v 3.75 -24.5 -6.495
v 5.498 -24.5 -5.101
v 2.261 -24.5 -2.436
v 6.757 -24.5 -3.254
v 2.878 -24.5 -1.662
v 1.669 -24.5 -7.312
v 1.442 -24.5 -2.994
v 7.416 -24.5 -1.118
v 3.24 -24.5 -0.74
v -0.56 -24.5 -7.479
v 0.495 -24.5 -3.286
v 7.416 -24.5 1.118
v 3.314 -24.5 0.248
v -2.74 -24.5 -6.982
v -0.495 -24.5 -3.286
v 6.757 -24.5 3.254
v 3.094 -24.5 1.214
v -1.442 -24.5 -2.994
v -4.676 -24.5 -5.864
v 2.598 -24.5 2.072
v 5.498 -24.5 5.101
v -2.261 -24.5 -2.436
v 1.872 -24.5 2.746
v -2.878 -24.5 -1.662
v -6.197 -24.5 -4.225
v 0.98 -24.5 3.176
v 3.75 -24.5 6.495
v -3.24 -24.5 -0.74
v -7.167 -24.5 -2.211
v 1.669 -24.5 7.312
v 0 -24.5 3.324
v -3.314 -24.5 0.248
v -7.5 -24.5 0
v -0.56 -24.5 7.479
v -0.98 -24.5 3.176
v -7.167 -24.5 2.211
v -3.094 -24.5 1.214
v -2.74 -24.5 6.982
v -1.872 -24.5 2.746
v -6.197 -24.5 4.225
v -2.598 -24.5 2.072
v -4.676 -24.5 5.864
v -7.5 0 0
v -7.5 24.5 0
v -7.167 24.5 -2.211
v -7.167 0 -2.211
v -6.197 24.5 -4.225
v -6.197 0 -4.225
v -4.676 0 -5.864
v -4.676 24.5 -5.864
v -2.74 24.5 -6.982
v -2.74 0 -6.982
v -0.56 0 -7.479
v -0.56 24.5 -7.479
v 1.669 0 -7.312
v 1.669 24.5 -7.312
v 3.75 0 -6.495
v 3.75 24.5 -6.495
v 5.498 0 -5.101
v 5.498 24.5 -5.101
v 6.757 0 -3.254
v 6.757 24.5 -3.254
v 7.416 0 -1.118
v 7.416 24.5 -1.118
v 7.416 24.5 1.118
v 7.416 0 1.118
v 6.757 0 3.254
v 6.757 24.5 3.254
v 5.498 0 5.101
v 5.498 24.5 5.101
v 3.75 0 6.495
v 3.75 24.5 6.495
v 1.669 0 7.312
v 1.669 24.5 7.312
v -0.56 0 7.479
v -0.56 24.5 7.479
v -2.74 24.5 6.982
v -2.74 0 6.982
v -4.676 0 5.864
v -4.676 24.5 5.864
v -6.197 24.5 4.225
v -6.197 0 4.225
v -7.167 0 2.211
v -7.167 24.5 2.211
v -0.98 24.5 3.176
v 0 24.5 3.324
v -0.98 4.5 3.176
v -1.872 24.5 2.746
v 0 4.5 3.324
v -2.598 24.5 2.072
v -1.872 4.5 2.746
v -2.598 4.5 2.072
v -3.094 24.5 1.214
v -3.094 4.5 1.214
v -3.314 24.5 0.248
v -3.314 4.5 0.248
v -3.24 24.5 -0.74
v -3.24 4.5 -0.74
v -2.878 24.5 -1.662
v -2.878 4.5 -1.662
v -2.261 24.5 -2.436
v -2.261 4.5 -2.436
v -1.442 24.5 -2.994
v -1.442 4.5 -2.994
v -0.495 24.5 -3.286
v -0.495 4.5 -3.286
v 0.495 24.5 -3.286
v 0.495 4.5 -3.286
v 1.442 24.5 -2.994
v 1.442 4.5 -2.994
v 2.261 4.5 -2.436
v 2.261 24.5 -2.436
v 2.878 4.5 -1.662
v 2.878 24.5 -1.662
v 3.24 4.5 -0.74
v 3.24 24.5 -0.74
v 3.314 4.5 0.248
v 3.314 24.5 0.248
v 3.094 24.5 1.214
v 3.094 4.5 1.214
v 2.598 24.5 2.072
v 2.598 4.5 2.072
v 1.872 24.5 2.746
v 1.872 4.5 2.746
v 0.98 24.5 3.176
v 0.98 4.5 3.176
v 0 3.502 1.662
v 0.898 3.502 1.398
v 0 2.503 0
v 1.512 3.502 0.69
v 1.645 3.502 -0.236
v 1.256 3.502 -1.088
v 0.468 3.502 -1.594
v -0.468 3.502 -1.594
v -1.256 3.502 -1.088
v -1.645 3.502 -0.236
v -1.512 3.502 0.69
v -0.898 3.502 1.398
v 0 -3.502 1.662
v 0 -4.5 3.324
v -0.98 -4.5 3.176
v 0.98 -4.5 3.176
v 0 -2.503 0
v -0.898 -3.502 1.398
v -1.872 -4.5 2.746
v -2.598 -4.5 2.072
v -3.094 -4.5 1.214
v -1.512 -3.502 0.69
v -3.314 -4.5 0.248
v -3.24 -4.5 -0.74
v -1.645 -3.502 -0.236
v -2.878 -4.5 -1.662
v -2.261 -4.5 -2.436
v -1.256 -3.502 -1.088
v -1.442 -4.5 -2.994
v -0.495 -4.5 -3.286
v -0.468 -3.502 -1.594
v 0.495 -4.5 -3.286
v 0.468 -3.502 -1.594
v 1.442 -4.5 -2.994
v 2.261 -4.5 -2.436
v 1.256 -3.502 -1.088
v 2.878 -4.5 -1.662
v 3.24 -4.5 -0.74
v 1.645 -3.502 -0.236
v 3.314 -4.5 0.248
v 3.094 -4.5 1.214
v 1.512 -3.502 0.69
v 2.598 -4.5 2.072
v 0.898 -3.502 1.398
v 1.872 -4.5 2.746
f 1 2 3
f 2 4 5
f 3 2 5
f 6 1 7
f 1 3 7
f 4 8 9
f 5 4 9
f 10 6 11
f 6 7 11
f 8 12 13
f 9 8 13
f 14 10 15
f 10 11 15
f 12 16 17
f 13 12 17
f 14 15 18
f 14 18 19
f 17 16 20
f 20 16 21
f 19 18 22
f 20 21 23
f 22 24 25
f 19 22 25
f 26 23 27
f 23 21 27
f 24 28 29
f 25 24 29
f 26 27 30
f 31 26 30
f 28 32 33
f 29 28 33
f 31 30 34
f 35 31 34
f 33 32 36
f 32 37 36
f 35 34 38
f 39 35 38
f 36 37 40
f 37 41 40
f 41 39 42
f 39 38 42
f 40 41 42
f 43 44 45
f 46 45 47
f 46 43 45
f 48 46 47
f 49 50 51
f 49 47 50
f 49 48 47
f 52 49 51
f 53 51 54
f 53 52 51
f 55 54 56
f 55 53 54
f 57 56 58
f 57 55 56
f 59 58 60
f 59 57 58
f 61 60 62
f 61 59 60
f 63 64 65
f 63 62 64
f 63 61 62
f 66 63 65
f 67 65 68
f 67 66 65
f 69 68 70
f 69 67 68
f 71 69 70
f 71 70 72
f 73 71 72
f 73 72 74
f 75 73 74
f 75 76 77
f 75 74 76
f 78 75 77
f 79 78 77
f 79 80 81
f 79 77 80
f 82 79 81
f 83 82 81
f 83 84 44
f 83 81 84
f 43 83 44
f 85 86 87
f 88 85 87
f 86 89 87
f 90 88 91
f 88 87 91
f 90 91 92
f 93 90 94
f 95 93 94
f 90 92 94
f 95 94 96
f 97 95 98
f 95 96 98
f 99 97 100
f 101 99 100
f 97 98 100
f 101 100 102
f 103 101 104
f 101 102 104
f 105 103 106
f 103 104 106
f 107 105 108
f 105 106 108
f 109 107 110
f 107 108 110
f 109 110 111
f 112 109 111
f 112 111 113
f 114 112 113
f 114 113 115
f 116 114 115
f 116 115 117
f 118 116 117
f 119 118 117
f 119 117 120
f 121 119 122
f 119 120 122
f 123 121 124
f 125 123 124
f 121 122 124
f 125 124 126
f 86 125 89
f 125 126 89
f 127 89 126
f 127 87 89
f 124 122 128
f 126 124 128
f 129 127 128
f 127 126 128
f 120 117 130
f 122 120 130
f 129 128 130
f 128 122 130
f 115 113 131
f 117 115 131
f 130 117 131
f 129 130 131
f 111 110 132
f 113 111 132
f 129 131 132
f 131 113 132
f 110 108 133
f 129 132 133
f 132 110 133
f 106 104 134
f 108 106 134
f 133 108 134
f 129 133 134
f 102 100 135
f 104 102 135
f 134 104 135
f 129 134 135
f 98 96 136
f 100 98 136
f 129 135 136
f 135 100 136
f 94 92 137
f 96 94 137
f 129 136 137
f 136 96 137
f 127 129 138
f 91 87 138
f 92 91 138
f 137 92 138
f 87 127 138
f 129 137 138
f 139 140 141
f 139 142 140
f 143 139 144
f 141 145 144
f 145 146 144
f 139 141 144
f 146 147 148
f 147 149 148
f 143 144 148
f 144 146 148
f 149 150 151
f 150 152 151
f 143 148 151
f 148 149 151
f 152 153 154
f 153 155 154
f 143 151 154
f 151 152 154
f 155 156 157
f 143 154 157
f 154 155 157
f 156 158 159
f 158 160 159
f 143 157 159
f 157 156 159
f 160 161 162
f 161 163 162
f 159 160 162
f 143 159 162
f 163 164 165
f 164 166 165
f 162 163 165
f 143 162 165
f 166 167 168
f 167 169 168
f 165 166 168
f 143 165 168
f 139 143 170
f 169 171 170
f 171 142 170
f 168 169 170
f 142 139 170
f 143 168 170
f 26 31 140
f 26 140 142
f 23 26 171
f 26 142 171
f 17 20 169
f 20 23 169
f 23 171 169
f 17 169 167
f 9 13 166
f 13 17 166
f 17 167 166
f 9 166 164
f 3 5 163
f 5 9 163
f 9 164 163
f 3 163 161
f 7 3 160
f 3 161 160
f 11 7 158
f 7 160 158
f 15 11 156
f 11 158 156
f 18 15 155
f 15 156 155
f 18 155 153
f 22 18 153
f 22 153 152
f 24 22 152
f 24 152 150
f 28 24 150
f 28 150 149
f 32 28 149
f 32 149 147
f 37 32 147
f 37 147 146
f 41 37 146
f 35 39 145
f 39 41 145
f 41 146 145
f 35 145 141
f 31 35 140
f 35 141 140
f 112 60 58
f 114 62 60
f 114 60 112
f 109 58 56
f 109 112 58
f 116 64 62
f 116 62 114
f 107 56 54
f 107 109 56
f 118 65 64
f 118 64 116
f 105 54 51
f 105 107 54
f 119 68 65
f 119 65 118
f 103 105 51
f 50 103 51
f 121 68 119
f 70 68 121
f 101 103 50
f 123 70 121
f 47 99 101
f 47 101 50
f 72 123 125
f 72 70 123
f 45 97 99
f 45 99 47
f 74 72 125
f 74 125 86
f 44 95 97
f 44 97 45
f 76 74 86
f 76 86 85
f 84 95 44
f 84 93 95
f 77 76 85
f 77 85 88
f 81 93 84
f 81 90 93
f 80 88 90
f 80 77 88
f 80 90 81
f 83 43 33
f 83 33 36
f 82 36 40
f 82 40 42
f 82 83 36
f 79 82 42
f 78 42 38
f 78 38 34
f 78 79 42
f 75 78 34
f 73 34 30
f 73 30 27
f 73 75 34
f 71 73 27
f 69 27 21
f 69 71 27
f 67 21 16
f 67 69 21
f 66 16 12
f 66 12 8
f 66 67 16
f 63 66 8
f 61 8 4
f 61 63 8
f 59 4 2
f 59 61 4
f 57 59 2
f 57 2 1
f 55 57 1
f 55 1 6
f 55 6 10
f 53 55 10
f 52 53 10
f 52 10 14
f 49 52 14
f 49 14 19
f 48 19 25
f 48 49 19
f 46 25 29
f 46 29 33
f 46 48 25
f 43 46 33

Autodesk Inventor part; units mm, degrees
ref_plane "YZ Plane" through (0, 0, 0) normal (1, 0, 0) x (0, 1, 0)
ref_plane "XZ Plane" through (0, 0, 0) normal (0, 1, 0) x (-1, 0, 0)
ref_plane "XY Plane" through (0, 0, 0) normal (0, 0, 1) x (1, 0, 0)
sketch "Sketch1" plane through (0, 0, 0) normal (0, 1, 0) x (-1, 0, 0)
  circle A0 centre (0, 0) radius 7.5
  dimension "d0" = 15
extrude "Extrusion1" add sketch "Sketch1" along normal mid plane 49
sketch "Sketch2" plane through (0, 24.5, 0) normal (0, 1, 0) x (1, 0, 0)
  point P0 (0, 0)
  point P1 (0, 0)
hole "Hole1" at (0, 24.5, 0) direction (0, -1, 0) diameter 6.647 depth 20 tip angle 118 thread size "M8x1.25" class "6H" standard "ISO Metric profile"
mirror "Mirror2" about plane through (0, 0, 0) normal (0, 1, 0) of "Hole1"
properties part number "Mid_structure_bar"
